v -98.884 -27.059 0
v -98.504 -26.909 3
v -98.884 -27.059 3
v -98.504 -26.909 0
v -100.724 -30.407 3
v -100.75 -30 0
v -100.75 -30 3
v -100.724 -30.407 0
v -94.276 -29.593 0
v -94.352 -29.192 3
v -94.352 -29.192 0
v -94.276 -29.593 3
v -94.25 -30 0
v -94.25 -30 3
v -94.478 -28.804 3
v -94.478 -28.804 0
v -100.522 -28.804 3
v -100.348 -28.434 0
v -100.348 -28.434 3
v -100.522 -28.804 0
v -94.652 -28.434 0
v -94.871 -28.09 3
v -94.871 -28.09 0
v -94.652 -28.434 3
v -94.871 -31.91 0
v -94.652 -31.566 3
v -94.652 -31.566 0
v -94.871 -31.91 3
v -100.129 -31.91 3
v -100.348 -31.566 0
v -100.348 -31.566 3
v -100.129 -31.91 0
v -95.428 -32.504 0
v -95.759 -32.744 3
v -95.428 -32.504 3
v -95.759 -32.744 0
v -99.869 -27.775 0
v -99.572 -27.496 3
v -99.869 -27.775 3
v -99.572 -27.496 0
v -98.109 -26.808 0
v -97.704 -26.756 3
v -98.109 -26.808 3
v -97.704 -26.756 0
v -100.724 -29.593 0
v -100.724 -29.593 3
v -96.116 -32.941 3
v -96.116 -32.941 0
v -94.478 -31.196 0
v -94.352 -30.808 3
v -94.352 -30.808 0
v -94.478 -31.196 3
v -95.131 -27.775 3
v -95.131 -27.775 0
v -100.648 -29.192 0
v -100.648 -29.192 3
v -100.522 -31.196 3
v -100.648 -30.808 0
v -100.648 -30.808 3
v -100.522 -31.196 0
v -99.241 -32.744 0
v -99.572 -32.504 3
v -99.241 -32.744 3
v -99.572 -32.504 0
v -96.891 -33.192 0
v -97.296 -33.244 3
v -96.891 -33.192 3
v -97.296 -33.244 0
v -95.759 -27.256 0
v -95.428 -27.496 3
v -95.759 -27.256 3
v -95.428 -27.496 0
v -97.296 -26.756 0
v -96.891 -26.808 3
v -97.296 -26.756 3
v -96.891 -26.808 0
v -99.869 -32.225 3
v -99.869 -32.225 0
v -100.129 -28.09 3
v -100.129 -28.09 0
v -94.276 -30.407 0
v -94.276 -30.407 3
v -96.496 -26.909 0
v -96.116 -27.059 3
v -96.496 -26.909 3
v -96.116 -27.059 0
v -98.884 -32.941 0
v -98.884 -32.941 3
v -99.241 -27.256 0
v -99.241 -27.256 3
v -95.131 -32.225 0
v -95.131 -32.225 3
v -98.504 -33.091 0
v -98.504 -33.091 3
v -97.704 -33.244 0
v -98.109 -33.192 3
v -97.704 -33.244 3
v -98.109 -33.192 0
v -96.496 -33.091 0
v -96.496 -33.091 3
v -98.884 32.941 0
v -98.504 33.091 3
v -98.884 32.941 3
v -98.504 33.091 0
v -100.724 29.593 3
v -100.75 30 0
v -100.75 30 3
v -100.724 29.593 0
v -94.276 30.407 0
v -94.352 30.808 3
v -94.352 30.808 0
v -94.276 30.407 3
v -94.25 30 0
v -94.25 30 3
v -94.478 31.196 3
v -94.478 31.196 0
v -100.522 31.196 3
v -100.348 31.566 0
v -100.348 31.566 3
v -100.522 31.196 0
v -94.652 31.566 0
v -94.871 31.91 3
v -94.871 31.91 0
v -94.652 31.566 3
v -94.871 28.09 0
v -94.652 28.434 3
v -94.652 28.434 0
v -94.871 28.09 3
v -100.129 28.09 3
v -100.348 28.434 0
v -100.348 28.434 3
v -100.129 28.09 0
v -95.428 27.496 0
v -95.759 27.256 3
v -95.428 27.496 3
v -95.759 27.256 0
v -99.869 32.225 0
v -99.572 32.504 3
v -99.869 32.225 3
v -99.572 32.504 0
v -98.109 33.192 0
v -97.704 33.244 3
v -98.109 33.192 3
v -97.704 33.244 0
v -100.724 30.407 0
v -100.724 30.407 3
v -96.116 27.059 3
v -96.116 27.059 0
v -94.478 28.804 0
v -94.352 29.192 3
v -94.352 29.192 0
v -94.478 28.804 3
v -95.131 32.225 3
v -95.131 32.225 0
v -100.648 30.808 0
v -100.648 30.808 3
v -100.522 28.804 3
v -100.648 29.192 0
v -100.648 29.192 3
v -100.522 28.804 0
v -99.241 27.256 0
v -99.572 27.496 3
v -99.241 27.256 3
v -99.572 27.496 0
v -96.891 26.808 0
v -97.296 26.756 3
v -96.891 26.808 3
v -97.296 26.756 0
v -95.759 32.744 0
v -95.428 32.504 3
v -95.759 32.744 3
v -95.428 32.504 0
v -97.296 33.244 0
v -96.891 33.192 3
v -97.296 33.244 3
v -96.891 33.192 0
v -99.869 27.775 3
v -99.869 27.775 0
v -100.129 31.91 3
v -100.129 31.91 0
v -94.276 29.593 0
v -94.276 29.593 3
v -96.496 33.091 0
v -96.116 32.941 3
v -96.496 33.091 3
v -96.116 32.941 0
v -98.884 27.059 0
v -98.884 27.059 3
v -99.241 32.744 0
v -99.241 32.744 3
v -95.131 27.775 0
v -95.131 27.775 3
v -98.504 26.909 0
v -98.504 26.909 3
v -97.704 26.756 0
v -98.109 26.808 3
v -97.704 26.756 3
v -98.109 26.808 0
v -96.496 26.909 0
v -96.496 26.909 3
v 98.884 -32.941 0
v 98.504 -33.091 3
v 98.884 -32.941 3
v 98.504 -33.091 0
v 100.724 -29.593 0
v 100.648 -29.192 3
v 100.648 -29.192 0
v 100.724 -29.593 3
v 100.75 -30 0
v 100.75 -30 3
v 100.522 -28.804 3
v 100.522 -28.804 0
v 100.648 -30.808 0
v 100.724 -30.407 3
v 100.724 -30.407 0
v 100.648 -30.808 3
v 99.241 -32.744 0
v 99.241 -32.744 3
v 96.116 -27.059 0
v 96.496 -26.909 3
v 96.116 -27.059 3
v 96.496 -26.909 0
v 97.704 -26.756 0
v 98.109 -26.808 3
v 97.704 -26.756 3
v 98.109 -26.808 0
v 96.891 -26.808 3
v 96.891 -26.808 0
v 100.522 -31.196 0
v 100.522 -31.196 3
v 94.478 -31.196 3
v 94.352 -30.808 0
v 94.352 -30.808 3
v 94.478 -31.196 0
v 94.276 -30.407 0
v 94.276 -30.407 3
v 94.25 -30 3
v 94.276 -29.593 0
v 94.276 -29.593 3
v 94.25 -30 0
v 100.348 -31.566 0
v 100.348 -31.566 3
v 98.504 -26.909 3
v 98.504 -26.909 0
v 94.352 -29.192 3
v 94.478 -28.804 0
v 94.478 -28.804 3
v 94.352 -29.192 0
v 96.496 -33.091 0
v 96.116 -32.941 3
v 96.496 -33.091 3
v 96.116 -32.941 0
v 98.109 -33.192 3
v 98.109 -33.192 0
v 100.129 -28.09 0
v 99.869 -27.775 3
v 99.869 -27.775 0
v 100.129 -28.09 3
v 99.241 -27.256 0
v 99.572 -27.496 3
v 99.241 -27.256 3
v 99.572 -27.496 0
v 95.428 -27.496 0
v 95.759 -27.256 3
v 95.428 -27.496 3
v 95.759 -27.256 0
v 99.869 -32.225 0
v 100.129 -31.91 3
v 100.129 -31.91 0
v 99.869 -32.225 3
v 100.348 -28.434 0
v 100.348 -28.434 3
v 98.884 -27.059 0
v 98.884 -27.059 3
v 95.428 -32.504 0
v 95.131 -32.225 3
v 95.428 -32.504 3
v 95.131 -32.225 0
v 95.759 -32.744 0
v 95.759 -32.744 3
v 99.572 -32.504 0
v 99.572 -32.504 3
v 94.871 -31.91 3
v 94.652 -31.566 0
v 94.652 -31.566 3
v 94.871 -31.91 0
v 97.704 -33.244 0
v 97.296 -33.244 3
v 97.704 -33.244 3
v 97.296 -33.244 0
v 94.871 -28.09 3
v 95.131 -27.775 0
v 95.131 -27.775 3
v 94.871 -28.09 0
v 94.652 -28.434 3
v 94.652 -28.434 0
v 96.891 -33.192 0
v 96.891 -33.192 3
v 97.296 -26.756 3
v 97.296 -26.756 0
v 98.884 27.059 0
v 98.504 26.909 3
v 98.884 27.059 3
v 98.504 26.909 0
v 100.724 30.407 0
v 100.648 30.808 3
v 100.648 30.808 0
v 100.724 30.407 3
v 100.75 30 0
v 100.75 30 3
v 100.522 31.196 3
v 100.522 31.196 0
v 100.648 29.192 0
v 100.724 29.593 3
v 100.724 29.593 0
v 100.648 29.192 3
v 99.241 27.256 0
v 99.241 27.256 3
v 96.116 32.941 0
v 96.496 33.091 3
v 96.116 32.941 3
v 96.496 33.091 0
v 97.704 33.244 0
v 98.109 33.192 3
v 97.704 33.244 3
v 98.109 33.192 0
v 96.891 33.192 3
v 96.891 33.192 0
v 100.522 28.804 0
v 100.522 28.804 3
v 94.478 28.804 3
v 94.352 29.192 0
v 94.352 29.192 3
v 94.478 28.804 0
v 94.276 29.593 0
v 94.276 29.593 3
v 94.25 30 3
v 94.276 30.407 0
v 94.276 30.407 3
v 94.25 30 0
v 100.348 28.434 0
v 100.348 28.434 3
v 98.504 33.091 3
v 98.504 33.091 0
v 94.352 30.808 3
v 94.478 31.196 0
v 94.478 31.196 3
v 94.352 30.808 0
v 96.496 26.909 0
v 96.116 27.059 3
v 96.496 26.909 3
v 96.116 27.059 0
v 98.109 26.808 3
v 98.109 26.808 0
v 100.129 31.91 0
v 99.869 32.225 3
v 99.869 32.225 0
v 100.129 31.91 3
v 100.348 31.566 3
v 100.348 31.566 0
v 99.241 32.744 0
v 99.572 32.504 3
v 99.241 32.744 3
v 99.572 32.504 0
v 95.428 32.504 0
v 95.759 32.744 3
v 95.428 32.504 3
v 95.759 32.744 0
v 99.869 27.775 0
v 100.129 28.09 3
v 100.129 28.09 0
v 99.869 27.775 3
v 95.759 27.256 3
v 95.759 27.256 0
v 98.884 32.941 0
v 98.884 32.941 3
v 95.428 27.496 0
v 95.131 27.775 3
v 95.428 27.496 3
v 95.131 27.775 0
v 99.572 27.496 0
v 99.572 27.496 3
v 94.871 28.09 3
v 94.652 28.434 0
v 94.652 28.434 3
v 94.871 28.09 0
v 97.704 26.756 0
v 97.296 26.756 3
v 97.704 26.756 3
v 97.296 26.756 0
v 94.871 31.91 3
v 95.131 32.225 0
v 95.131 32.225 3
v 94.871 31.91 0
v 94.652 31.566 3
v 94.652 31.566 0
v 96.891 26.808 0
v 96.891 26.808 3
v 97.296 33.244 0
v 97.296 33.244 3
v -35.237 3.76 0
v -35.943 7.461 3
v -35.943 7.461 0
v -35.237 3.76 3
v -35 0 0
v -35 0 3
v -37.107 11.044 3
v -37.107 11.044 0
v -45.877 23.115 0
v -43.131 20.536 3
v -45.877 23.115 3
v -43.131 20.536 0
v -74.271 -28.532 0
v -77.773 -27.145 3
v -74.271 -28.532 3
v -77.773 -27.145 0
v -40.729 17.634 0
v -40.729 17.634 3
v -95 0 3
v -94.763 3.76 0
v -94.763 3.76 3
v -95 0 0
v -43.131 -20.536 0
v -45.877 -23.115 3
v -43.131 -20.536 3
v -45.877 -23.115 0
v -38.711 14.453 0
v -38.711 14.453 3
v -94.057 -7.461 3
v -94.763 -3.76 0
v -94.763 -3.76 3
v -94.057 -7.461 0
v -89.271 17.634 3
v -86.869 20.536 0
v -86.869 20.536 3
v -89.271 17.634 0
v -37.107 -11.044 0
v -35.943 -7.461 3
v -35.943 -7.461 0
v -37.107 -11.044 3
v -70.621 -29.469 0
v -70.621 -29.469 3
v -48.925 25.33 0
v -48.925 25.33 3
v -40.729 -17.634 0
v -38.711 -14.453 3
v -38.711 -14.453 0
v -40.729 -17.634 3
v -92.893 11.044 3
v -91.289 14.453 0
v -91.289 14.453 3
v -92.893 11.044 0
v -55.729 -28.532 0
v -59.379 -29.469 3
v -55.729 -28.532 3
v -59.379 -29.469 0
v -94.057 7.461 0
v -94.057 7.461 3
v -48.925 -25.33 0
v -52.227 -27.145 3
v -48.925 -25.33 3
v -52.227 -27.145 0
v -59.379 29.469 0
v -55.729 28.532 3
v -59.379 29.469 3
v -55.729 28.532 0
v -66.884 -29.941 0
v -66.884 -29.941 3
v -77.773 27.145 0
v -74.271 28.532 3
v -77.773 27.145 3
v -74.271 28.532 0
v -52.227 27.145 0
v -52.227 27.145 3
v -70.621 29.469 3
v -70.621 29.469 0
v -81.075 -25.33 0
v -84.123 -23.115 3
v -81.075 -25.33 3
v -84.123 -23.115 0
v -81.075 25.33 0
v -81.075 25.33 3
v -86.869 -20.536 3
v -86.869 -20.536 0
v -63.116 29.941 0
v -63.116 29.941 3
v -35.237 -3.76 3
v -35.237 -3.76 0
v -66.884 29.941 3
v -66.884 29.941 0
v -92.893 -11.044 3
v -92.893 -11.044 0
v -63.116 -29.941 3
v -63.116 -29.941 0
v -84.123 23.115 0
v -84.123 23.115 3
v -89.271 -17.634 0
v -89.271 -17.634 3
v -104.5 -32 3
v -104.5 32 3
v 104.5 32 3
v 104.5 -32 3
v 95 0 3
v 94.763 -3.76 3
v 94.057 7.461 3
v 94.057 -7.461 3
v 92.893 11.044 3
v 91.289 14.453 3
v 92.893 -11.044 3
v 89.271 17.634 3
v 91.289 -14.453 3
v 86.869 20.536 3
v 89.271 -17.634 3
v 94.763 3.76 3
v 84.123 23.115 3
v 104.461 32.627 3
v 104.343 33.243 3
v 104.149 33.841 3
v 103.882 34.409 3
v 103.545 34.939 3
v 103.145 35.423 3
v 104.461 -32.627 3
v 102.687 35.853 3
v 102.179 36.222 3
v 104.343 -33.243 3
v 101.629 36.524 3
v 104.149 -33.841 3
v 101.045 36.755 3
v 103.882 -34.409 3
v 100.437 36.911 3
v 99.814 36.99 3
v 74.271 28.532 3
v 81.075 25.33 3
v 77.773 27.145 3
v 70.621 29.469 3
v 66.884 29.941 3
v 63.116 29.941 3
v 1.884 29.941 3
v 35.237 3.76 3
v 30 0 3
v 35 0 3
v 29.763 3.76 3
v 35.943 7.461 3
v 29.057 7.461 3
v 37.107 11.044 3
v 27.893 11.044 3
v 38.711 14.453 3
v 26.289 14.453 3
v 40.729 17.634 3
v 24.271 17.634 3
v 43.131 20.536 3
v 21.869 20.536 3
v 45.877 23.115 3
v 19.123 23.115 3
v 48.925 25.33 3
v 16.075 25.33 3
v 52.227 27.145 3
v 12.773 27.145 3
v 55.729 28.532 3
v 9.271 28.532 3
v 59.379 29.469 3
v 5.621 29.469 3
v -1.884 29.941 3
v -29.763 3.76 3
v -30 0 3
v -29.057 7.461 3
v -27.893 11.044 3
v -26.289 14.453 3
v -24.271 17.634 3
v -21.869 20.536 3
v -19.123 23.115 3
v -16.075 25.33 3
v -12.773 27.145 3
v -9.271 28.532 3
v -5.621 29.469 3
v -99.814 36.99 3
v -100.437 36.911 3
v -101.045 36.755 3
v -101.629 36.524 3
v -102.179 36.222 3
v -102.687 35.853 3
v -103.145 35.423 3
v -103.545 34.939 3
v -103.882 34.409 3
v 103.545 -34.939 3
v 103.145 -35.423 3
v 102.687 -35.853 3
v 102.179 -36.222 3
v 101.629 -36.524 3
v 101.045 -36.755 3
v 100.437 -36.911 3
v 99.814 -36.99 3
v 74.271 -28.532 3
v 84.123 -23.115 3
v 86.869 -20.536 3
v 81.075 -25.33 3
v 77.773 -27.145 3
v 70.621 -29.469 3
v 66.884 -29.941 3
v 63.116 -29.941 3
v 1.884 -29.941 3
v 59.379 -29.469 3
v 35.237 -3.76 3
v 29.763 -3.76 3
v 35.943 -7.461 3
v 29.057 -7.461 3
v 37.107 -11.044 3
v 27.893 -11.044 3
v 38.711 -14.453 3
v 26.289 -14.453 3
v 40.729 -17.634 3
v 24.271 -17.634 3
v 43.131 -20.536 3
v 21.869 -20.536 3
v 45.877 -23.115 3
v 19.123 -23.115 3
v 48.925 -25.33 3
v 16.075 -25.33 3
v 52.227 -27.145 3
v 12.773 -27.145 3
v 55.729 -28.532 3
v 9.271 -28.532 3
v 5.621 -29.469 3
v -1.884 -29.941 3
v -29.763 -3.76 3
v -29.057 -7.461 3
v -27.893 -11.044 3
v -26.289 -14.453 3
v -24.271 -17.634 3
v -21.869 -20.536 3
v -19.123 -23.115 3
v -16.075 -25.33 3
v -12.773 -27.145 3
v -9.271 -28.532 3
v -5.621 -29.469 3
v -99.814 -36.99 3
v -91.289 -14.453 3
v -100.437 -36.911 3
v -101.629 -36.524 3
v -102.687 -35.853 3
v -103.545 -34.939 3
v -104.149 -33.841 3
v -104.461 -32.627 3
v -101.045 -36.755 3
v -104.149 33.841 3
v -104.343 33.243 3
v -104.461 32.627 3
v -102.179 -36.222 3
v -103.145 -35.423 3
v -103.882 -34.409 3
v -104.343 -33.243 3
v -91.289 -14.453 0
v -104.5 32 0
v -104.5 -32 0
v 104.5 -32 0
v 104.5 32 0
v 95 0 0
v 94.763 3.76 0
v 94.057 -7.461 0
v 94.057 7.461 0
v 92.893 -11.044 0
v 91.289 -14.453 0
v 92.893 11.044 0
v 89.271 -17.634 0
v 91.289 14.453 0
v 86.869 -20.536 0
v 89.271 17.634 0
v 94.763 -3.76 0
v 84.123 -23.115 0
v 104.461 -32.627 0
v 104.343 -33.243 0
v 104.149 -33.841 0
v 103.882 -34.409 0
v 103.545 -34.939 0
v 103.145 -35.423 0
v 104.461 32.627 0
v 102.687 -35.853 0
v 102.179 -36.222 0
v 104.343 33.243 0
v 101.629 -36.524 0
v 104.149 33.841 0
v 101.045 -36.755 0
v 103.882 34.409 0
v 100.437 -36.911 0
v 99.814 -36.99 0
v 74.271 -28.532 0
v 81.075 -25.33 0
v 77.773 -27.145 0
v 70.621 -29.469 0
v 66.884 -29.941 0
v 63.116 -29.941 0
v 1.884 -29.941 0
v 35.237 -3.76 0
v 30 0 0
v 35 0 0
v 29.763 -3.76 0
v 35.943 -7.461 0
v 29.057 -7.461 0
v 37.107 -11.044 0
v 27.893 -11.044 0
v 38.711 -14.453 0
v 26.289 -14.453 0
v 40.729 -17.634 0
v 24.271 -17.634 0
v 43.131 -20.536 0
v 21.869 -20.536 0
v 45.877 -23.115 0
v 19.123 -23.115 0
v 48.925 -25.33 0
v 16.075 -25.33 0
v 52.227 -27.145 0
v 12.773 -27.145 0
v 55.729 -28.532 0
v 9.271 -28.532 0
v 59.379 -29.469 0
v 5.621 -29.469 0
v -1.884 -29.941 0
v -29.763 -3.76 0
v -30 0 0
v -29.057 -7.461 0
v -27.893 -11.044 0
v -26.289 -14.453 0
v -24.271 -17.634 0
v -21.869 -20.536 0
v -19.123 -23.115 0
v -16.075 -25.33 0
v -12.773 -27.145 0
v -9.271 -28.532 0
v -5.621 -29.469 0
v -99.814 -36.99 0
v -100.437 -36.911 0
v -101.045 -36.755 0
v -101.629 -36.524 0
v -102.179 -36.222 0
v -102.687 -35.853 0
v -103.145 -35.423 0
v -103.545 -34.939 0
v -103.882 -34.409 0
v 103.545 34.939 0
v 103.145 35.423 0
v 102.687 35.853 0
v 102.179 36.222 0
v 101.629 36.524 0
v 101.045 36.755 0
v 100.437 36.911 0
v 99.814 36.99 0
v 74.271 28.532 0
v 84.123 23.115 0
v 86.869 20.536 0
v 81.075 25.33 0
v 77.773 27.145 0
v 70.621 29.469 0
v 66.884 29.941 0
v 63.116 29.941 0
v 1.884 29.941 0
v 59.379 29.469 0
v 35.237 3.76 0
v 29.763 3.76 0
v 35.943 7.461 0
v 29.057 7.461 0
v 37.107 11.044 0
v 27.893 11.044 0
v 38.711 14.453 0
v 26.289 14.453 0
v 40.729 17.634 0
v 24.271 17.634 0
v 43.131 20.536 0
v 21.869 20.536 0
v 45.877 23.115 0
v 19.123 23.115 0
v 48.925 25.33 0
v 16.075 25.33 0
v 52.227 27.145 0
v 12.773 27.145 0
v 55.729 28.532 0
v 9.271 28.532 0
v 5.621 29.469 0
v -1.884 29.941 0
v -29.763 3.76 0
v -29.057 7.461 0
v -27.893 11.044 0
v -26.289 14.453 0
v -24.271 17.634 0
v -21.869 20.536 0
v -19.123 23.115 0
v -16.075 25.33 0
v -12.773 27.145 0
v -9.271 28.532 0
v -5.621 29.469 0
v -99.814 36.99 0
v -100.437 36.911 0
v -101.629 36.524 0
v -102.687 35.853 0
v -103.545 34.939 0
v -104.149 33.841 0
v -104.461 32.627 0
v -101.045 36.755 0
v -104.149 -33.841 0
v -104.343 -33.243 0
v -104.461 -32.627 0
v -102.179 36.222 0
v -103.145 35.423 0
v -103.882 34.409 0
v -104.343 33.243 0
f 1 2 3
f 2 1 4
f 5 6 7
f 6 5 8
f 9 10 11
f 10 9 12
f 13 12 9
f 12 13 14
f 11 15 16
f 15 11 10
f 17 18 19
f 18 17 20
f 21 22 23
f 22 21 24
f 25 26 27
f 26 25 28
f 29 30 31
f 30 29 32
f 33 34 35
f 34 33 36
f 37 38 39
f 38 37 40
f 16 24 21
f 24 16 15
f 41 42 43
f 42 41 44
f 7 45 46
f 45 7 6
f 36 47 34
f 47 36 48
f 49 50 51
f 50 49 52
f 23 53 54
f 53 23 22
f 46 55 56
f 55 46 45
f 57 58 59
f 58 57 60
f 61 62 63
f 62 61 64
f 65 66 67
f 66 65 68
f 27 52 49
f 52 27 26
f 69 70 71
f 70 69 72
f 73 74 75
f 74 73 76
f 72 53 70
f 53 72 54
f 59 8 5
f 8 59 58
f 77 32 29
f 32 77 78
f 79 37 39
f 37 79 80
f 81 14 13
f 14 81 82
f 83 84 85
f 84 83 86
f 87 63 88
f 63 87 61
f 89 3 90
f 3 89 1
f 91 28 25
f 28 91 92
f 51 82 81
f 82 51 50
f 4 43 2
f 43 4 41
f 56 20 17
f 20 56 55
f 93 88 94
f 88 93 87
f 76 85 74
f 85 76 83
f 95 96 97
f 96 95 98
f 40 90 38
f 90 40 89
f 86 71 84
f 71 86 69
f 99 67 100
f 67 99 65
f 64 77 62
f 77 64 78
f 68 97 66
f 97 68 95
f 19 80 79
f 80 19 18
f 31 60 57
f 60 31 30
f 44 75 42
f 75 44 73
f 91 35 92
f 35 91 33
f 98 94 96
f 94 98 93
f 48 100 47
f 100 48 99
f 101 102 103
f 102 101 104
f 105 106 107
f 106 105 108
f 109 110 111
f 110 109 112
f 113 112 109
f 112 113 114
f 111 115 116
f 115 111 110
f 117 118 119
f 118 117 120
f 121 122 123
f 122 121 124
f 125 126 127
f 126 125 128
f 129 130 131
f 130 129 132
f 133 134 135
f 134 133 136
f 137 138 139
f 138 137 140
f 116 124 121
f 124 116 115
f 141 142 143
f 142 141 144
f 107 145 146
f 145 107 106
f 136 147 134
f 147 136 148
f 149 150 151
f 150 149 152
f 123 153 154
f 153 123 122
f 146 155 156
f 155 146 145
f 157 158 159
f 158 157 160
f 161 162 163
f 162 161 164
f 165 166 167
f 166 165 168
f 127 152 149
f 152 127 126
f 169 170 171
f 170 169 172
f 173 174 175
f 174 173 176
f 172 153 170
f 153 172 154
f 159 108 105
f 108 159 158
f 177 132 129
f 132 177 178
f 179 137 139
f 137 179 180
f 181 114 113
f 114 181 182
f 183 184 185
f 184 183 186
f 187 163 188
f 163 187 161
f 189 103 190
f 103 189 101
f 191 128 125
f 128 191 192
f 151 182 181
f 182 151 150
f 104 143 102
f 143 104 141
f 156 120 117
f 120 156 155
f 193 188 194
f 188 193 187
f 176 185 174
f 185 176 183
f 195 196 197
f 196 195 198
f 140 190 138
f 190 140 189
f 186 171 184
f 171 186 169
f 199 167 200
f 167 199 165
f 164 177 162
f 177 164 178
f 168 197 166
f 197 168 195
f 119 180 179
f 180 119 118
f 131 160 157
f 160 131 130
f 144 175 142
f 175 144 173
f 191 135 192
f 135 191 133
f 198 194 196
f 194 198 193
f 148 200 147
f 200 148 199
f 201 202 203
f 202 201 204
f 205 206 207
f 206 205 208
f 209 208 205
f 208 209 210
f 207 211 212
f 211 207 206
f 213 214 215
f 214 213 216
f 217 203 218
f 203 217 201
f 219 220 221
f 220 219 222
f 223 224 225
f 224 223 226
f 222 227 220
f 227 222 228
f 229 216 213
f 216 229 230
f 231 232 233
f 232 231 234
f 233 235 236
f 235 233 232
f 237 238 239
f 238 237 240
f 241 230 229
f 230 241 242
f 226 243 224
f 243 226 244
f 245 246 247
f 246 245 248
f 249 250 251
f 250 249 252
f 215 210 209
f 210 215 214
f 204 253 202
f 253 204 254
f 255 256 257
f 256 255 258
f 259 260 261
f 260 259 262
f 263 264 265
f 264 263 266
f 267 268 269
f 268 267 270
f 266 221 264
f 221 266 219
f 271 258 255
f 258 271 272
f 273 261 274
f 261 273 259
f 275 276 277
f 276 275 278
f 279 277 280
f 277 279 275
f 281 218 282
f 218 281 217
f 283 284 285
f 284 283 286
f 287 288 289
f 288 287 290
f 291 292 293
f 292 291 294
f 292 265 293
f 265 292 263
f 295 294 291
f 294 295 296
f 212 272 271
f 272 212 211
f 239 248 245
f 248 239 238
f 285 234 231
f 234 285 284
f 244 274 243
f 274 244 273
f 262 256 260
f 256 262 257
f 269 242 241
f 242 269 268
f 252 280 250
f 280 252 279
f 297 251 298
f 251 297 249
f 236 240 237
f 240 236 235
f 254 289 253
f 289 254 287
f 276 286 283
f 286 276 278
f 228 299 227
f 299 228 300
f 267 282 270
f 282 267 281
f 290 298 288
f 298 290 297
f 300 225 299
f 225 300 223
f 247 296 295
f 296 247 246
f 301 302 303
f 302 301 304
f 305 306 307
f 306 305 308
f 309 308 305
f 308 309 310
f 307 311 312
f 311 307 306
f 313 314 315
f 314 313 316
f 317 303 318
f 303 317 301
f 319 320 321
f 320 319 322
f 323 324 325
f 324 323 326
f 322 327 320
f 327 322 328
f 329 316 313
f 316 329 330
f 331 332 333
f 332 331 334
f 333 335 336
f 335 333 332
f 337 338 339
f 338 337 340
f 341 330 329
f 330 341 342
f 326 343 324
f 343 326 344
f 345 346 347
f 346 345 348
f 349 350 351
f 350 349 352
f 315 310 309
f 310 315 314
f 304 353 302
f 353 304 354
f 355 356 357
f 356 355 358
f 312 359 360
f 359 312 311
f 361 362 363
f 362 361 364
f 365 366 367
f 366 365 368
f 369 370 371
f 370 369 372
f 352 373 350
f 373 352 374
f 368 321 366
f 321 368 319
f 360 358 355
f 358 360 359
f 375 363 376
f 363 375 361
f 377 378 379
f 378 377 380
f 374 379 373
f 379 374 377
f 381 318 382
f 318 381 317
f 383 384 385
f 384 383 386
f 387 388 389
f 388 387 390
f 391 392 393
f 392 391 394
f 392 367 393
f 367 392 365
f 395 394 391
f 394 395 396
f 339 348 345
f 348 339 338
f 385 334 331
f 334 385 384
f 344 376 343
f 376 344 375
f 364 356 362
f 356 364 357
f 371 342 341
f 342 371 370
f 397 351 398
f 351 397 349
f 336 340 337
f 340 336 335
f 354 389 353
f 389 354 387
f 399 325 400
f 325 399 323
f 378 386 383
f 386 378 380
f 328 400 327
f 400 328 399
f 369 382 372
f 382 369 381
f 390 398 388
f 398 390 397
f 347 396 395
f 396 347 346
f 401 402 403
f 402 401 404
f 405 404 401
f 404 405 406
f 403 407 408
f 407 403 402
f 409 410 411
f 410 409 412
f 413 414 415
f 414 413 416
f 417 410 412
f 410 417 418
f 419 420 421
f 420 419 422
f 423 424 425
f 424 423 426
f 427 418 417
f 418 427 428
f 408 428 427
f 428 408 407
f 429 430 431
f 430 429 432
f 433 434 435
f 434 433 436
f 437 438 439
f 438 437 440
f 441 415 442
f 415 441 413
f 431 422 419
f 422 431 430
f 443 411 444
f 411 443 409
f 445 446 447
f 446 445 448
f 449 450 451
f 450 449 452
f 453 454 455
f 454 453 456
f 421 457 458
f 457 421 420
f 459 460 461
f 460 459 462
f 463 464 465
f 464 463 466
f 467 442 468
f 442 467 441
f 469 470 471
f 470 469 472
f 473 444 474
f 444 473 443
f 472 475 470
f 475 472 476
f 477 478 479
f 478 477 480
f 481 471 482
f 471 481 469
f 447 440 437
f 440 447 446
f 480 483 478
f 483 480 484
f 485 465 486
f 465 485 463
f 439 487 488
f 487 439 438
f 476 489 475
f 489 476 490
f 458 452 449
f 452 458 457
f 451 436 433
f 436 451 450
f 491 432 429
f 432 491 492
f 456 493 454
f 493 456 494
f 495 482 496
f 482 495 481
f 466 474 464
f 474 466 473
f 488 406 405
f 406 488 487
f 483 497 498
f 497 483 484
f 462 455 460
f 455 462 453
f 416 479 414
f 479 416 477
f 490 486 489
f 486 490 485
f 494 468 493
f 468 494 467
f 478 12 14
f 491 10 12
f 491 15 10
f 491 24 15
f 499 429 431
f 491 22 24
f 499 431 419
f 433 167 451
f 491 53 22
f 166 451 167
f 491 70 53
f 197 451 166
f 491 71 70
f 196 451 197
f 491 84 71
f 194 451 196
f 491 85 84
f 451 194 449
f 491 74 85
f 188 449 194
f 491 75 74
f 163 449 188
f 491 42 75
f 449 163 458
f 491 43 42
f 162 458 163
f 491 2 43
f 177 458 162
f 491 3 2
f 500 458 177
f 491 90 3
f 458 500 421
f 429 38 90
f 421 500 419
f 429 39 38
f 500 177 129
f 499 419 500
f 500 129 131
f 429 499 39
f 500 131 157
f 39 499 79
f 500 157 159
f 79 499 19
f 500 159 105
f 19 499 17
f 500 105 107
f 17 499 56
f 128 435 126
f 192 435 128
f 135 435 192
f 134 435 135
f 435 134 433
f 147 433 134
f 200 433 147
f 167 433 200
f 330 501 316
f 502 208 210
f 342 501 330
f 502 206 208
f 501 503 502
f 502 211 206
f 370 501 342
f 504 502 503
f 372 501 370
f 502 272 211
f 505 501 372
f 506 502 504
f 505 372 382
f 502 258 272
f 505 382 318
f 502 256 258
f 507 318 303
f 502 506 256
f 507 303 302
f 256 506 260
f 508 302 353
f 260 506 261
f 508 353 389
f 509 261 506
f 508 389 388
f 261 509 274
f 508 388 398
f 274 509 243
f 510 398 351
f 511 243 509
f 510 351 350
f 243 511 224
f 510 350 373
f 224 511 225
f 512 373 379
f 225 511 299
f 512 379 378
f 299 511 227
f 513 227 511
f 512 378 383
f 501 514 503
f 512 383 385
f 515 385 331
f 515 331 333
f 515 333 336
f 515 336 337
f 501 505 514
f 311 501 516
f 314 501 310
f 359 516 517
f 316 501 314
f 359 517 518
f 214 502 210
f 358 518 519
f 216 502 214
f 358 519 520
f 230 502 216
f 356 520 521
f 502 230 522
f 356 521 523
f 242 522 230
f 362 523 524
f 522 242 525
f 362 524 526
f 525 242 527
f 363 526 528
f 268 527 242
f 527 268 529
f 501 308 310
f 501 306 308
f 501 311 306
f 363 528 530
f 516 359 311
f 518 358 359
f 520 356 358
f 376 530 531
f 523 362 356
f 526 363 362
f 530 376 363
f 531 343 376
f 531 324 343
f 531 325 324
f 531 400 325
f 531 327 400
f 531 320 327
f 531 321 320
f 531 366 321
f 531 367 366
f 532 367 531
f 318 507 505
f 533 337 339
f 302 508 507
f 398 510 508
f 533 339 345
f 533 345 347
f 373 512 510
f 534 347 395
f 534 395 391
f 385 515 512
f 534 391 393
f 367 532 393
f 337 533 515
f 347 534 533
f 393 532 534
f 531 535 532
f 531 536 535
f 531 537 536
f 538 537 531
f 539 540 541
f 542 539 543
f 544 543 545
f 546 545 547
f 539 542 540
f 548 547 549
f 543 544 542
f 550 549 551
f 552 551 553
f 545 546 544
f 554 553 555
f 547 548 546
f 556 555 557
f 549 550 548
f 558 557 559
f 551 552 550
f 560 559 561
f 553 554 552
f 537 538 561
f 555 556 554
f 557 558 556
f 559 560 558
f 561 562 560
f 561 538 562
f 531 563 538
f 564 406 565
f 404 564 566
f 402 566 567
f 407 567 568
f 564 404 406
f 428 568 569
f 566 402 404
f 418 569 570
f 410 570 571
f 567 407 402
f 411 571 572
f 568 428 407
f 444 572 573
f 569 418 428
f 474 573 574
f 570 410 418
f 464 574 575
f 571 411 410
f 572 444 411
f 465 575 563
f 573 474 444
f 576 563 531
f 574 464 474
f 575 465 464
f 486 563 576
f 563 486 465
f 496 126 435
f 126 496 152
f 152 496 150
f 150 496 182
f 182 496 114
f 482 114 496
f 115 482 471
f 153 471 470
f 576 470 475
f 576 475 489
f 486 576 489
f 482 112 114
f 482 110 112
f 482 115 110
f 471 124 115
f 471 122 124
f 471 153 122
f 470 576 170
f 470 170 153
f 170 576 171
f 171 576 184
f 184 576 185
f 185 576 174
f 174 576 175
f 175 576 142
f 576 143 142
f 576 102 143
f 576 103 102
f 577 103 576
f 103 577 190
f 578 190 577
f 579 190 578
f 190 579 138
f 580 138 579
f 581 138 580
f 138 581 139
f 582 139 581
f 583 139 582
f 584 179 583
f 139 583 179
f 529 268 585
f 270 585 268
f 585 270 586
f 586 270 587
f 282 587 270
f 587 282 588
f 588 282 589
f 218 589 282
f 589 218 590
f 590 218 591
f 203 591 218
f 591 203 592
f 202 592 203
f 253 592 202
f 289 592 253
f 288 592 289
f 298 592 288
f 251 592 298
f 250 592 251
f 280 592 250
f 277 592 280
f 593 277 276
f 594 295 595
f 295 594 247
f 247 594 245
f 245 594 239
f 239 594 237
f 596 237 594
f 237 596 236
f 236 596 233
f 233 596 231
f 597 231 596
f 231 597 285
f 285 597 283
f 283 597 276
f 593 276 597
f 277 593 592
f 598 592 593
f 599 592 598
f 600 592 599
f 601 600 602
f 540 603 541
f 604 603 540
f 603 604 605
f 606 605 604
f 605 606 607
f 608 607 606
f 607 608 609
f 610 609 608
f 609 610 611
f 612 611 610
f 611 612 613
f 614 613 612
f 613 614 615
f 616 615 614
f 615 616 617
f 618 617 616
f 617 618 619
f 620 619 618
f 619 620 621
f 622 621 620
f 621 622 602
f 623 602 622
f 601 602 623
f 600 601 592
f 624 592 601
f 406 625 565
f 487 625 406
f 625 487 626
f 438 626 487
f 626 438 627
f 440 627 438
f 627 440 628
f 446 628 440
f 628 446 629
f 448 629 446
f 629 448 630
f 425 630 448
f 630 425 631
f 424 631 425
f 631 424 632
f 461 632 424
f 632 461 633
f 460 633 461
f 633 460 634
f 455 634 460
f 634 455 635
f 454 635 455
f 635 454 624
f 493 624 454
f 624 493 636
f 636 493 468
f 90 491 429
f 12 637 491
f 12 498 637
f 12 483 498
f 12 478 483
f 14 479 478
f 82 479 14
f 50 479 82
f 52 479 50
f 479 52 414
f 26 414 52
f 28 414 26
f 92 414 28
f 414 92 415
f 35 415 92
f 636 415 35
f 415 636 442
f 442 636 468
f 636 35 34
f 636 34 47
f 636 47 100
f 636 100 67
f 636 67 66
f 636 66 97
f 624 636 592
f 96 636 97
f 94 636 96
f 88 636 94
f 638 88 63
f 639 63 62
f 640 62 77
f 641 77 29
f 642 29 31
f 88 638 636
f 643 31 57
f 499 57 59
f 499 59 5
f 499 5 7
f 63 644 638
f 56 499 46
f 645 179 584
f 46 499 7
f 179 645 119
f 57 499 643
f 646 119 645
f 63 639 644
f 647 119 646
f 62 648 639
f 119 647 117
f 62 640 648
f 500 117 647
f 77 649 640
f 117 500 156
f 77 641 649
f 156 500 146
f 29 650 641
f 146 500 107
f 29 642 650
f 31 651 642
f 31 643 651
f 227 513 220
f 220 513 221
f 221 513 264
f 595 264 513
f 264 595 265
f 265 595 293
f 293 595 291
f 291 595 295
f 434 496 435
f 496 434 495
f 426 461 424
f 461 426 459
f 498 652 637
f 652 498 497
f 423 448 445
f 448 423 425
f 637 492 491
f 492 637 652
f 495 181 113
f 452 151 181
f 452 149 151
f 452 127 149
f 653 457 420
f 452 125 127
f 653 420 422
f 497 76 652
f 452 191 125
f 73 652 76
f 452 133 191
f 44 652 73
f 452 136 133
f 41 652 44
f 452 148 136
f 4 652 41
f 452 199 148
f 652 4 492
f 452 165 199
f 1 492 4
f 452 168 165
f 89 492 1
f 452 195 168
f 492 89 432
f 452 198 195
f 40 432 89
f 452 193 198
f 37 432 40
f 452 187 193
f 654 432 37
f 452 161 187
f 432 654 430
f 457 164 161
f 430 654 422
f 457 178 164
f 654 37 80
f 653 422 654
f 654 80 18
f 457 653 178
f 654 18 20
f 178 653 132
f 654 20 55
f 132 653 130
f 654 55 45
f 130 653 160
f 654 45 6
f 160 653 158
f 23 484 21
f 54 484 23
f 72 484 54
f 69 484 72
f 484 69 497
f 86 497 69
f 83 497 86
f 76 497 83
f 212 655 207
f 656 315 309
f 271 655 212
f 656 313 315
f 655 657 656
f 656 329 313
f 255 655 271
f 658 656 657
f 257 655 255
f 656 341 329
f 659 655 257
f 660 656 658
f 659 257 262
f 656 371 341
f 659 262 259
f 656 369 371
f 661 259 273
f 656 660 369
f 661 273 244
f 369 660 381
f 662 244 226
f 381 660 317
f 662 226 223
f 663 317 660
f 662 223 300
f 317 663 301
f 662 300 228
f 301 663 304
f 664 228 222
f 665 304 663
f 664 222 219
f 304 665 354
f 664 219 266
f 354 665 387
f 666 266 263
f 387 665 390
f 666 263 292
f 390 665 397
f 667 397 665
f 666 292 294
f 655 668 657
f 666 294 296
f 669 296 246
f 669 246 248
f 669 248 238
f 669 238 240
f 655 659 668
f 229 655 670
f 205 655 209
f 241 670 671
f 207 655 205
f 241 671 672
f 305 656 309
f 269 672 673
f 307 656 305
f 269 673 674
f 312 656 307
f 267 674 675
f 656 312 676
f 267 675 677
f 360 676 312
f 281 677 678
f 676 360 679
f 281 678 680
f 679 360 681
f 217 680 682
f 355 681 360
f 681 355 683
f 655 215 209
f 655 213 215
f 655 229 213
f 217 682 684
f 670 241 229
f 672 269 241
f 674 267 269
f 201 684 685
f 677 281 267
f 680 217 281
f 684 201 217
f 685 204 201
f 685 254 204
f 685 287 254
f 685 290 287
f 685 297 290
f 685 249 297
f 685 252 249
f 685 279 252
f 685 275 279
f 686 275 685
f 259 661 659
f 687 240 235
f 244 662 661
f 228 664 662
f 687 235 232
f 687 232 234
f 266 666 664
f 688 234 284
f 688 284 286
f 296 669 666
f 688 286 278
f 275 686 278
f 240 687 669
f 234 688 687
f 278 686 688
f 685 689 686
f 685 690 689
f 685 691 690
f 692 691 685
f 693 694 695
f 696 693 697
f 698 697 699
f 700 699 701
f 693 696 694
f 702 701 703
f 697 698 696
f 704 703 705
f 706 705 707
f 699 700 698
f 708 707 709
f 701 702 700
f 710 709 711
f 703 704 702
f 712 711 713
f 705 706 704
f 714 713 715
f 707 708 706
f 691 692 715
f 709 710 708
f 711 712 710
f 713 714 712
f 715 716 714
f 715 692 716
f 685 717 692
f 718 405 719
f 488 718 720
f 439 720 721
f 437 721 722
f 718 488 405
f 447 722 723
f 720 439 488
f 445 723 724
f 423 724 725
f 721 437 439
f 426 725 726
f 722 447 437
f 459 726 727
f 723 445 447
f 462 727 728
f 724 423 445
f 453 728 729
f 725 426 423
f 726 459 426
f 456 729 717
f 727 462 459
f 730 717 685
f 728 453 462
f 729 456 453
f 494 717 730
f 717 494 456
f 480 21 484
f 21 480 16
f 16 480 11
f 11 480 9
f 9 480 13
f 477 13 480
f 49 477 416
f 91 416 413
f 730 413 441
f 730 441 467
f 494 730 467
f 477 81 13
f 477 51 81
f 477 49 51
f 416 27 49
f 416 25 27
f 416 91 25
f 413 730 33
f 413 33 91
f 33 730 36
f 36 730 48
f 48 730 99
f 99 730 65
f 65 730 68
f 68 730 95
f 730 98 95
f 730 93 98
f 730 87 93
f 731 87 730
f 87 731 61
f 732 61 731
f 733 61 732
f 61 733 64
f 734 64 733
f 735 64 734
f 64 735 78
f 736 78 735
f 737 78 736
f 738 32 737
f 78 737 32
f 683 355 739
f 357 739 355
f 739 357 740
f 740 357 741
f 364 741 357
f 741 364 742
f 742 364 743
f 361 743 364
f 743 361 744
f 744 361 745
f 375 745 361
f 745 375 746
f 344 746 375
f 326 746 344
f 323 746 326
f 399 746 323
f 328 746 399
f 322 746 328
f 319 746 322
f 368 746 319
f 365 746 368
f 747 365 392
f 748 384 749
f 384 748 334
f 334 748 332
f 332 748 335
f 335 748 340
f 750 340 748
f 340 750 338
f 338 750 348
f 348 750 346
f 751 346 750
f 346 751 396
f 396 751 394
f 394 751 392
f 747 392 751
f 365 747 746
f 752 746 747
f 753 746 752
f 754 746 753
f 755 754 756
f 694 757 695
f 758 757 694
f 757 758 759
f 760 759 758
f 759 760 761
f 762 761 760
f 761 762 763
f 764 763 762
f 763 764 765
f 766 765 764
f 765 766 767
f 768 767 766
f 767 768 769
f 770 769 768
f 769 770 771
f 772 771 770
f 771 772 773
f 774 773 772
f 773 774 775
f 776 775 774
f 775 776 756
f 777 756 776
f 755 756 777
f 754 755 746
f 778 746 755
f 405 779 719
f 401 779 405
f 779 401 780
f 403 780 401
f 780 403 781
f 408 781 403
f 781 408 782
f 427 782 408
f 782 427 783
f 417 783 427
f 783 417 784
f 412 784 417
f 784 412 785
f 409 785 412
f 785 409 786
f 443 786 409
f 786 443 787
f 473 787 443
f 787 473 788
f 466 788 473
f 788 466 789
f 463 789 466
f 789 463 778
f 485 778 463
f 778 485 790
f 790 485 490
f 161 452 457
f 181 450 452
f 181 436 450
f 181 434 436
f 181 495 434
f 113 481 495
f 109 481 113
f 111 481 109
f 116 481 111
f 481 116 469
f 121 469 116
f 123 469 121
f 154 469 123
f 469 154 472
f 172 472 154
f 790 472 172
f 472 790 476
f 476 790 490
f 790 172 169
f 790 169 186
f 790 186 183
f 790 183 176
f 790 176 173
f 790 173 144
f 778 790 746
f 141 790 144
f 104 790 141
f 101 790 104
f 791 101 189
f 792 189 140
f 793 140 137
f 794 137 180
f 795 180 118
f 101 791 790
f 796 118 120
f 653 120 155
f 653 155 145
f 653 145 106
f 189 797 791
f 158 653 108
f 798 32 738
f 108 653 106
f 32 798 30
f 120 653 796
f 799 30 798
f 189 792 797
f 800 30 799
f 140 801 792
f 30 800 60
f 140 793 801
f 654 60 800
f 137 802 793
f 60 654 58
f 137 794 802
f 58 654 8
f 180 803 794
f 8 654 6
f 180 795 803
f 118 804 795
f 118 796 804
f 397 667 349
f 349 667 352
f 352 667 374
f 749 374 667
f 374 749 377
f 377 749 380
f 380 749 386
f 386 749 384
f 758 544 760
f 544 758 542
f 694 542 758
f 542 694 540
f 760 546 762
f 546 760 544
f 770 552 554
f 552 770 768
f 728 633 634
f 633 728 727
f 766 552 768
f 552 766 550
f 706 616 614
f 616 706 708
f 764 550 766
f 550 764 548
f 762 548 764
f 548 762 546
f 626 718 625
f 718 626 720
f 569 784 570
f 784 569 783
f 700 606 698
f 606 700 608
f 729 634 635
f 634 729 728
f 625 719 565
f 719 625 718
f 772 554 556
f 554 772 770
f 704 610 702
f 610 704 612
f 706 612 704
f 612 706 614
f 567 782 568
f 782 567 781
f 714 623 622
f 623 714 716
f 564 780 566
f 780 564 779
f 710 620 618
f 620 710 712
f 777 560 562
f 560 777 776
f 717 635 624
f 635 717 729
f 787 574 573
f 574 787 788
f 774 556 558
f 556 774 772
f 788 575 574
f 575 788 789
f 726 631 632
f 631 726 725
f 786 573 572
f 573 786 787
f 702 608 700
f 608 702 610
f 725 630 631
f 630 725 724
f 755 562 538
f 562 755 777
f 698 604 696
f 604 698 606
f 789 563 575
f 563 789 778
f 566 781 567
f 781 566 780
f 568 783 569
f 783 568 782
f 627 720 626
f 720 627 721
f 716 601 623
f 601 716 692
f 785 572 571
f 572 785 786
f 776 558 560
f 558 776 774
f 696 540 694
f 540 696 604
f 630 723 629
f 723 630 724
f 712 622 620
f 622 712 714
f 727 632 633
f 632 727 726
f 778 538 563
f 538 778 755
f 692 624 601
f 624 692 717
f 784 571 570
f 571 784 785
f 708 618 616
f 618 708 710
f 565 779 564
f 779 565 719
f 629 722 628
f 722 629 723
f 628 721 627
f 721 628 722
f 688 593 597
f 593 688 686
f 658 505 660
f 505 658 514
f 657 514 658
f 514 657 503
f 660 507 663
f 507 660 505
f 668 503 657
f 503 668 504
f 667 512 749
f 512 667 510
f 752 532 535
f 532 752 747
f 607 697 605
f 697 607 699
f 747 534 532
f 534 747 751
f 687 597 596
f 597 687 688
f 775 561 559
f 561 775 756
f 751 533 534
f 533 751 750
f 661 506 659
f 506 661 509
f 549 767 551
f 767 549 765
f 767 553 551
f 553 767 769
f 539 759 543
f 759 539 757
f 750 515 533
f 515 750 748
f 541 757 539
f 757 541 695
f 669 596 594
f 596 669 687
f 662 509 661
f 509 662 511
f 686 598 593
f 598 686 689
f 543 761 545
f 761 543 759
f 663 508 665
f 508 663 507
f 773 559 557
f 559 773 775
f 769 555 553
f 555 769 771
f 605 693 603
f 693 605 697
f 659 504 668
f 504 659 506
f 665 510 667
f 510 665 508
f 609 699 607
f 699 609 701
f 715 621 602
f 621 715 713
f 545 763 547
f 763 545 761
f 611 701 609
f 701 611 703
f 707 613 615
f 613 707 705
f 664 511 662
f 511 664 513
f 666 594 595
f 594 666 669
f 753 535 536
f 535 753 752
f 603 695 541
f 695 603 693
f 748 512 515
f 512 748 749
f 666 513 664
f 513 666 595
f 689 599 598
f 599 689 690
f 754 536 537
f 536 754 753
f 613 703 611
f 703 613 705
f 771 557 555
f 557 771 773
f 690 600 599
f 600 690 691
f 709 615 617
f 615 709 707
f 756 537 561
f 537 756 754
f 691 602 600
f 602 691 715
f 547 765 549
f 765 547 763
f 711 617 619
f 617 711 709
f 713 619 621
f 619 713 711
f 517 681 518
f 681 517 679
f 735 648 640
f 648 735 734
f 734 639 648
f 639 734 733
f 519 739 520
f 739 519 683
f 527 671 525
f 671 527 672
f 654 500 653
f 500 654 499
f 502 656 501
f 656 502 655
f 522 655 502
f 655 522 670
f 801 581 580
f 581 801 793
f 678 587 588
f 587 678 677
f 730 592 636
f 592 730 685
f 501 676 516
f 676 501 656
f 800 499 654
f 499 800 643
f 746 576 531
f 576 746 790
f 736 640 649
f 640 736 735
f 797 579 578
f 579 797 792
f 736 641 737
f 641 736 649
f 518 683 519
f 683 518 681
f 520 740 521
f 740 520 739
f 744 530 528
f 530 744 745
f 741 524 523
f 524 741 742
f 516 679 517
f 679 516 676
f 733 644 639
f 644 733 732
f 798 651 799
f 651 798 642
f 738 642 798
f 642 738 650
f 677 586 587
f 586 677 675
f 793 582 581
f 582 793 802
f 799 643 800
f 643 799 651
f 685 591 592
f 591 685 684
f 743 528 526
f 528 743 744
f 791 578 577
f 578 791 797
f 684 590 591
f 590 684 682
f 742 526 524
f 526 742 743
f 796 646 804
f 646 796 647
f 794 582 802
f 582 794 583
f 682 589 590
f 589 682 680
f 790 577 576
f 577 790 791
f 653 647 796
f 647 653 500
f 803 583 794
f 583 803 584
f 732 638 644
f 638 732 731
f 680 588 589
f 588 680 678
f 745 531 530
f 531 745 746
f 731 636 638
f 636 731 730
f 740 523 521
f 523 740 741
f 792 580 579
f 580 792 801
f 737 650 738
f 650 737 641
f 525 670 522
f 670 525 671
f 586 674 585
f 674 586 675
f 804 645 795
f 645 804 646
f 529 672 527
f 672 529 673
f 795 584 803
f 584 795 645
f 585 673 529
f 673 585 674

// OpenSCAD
$fn = 50;


difference() {
	union() {
		hull() {
			translate(v = [-99.5000000000, 32.0000000000, 0]) {
				cylinder(h = 3, r = 5);
			}
			translate(v = [99.5000000000, 32.0000000000, 0]) {
				cylinder(h = 3, r = 5);
			}
			translate(v = [-99.5000000000, -32.0000000000, 0]) {
				cylinder(h = 3, r = 5);
			}
			translate(v = [99.5000000000, -32.0000000000, 0]) {
				cylinder(h = 3, r = 5);
			}
		}
	}
	union() {
		#translate(v = [-97.5000000000, -30.0000000000, -100.0000000000]) {
			cylinder(h = 200, r = 3.2500000000);
		}
		#translate(v = [-97.5000000000, 30.0000000000, -100.0000000000]) {
			cylinder(h = 200, r = 3.2500000000);
		}
		#translate(v = [97.5000000000, -30.0000000000, -100.0000000000]) {
			cylinder(h = 200, r = 3.2500000000);
		}
		#translate(v = [97.5000000000, 30.0000000000, -100.0000000000]) {
			cylinder(h = 200, r = 3.2500000000);
		}
		#translate(v = [-65.0000000000, 0, 0]) {
			cylinder(h = 3, r = 30.0000000000);
		}
		#cylinder(h = 3, r = 30.0000000000);
		#translate(v = [65.0000000000, 0, 0]) {
			cylinder(h = 3, r = 30.0000000000);
		}
	}
}
